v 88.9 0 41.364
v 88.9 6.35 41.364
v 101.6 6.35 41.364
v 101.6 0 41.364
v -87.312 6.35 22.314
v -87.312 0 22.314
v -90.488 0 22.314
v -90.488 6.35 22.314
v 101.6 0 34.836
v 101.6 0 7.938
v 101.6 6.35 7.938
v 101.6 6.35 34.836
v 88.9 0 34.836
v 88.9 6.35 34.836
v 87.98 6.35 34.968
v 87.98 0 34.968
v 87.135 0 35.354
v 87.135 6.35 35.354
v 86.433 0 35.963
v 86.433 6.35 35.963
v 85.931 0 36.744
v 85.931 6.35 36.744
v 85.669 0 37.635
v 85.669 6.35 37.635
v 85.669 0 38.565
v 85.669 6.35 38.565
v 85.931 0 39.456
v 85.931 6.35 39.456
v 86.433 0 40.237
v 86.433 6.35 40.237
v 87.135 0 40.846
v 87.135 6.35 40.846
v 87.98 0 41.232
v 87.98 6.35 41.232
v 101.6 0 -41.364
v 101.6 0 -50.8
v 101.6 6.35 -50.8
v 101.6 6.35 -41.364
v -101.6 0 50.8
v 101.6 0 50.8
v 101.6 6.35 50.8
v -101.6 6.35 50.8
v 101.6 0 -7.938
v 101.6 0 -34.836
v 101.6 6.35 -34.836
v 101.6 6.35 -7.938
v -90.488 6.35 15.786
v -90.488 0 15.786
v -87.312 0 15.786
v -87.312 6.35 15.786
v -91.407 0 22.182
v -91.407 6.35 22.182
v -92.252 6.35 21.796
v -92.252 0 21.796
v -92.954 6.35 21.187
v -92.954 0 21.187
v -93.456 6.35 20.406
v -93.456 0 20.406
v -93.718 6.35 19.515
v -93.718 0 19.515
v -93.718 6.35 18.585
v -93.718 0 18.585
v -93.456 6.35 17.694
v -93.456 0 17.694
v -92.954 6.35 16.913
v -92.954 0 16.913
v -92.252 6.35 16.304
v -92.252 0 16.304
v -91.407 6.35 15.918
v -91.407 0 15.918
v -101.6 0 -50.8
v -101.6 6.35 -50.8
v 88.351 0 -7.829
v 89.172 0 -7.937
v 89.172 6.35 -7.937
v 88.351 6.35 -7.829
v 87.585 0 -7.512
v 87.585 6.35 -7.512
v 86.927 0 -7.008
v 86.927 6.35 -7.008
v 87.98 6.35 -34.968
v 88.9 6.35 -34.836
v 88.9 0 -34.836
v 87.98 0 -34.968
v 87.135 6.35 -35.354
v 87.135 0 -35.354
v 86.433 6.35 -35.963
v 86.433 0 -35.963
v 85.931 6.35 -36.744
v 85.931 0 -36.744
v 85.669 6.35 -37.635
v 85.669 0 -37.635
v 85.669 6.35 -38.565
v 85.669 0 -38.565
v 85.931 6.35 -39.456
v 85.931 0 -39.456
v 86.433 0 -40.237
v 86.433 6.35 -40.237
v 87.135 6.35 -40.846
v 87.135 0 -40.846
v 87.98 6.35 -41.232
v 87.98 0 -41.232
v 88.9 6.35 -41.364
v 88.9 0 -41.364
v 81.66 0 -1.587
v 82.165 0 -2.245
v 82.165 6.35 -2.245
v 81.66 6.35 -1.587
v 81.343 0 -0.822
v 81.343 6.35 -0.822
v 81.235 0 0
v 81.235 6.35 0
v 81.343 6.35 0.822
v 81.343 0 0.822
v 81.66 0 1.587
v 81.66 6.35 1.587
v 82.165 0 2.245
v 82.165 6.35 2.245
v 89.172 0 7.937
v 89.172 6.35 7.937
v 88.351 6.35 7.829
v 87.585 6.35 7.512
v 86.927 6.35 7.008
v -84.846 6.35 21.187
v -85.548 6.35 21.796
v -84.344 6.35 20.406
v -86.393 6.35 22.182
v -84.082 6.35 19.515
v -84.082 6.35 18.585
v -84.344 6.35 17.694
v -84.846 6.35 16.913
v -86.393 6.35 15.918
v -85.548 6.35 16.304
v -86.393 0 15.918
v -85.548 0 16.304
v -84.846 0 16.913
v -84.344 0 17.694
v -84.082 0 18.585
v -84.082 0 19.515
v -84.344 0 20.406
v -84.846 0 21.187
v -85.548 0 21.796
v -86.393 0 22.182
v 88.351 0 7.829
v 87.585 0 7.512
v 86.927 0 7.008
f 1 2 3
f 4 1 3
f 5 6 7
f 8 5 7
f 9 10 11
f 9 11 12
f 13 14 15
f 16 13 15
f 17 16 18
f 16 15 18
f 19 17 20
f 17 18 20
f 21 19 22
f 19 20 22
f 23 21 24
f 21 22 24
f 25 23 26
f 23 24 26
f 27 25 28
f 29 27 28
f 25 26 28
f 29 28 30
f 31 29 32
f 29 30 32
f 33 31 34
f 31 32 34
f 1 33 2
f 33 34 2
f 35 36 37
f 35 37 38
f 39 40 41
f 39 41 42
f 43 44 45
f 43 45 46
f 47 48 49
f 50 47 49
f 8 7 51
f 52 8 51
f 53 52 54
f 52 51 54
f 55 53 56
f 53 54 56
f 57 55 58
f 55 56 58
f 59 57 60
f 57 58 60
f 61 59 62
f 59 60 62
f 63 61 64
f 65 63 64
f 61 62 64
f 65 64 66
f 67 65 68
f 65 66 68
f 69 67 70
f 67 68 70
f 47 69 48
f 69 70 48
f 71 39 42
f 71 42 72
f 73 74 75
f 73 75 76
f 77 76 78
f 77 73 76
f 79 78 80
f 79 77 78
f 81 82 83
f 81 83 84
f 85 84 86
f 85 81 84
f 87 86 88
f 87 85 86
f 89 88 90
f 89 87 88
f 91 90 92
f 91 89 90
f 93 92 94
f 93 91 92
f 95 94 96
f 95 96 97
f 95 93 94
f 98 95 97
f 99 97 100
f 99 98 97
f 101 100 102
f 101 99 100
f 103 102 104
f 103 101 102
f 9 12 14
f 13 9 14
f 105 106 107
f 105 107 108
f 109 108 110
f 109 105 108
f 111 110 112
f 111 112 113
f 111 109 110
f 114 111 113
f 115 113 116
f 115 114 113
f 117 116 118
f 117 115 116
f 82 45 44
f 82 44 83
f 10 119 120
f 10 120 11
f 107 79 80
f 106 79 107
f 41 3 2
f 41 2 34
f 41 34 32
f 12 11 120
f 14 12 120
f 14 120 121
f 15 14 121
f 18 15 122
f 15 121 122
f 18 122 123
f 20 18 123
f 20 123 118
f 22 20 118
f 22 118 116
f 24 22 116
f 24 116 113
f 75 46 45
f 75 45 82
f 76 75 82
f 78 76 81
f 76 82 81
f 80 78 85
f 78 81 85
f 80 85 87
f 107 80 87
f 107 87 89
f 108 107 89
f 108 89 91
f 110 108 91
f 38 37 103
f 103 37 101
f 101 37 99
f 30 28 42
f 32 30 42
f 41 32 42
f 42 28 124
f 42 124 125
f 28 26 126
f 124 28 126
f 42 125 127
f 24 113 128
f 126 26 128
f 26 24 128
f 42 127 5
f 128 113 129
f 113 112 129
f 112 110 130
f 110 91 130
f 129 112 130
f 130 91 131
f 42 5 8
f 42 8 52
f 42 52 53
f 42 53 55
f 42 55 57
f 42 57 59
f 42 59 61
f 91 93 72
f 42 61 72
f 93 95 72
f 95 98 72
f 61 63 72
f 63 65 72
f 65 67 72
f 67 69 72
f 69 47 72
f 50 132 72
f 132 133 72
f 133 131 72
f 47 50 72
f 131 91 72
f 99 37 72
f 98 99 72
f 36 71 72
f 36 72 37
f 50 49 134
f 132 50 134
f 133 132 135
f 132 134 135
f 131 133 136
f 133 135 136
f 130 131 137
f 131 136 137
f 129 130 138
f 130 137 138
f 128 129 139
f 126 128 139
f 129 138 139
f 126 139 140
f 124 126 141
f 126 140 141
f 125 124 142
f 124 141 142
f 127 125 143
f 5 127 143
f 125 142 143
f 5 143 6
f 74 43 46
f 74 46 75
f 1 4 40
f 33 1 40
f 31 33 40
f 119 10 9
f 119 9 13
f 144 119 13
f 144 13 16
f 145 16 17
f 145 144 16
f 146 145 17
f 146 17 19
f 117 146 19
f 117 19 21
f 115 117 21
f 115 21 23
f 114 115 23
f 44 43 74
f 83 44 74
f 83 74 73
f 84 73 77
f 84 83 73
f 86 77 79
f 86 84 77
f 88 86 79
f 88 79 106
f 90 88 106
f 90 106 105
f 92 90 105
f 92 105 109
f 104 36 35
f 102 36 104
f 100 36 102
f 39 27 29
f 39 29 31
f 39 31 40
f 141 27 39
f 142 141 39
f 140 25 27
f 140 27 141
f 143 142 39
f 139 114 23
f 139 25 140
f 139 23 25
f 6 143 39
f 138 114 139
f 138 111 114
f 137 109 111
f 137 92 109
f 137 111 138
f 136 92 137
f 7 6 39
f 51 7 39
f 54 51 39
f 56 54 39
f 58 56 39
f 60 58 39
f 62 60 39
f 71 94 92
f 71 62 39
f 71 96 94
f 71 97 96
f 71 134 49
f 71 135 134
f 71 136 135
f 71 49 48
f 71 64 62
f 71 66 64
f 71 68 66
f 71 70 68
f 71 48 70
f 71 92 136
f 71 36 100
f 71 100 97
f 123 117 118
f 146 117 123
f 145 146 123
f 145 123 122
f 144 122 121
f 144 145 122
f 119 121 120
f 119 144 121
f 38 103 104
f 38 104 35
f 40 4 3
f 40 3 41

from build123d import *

# Parameters (mm, degrees)
BOSS_EXTRUDE1_DEPTH         = 6.35
F_1_4_CLEARANCE_HOLE1_D     = 6.5278
F_1_4_CLEARANCE_HOLE1_DEPTH = 6.35
CUT_EXTRUDE1_DEPTH          = 6.35
CUT_EXTRUDE2_START          = -6.35
CUT_EXTRUDE2_DEPTH          = 6.35


with BuildPart() as part:
    # Sketch1 → Boss-Extrude1 (new body)
    with BuildSketch(Plane(origin=(0, 0, 0), x_dir=(1, 0, 0), z_dir=(0, 1, 0))):
        with BuildLine():
            Line((-101.6, 50.8), (101.6, 50.8))
            Line((101.6, 50.8), (101.6, 7.9375))
            Line((101.6, 7.9375), (89.172371939, 7.9375))
            ThreePointArc((89.172371939, 7.9375), (87.957352042, 7.695817516), (86.927307909, 7.00756403))
            Line((86.927307909, 7.00756403), (82.164807909, 2.24506403))
            ThreePointArc((82.164807909, 2.24506403), (81.234871939, 0), (82.164807909, -2.24506403))
            Line((82.164807909, -2.24506403), (86.927307909, -7.00756403))
            ThreePointArc((86.927307909, -7.00756403), (87.957352042, -7.695817516), (89.172371939, -7.9375))
            Line((89.172371939, -7.9375), (101.6, -7.9375))
            Line((101.6, -7.9375), (101.6, -50.8))
            Line((101.6, -50.8), (-101.6, -50.8))
            Line((-101.6, -50.8), (-101.6, 50.8))
        make_face()
    extrude(amount=BOSS_EXTRUDE1_DEPTH)

    # 1/4 Clearance Hole1
    with Locations(Plane(origin=(0, 6.35, 0), x_dir=(-1, 0, 0), z_dir=(0, 1, 0))):
        with Locations((-88.9, 38.1), (-88.9, -38.1), (88.9, 19.05)):
            Hole(F_1_4_CLEARANCE_HOLE1_D / 2, depth=F_1_4_CLEARANCE_HOLE1_DEPTH)

    # Sketch4 → Cut-Extrude1 (cut)
    with BuildSketch(Plane(origin=(0, 6.35, 0), x_dir=(1, 0, 0), z_dir=(0, 1, 0))):
        with BuildLine():
            Line((88.9, 41.3639), (101.6, 41.3639))
            Line((101.6, 41.3639), (101.6, 34.8361))
            Line((101.6, 34.8361), (88.9, 34.8361))
            ThreePointArc((88.9, 34.8361), (85.6361, 38.1), (88.9, 41.3639))
        make_face()
    cut_extrude1 = extrude(amount=-CUT_EXTRUDE1_DEPTH, mode=Mode.SUBTRACT)

    # Mirror1: Cut-Extrude1 across plane
    add(cut_extrude1.mirror(Plane.XY), mode=Mode.SUBTRACT)

    # Sketch5 → Cut-Extrude2 (cut)
    with BuildSketch(Plane(origin=(0, 6.35, 0), x_dir=(1, 0, 0), z_dir=(0, 1, 0)).offset(CUT_EXTRUDE2_START)):
        with BuildLine():
            Line((-90.4875, -15.7861), (-87.3125, -15.7861))
            ThreePointArc((-87.3125, -15.7861), (-84.0486, -19.05), (-87.3125, -22.3139))
            Line((-87.3125, -22.3139), (-90.4875, -22.3139))
            ThreePointArc((-90.4875, -22.3139), (-93.7514, -19.05), (-90.4875, -15.7861))
        make_face()
    extrude(amount=CUT_EXTRUDE2_DEPTH, mode=Mode.SUBTRACT)


solid = part.part
